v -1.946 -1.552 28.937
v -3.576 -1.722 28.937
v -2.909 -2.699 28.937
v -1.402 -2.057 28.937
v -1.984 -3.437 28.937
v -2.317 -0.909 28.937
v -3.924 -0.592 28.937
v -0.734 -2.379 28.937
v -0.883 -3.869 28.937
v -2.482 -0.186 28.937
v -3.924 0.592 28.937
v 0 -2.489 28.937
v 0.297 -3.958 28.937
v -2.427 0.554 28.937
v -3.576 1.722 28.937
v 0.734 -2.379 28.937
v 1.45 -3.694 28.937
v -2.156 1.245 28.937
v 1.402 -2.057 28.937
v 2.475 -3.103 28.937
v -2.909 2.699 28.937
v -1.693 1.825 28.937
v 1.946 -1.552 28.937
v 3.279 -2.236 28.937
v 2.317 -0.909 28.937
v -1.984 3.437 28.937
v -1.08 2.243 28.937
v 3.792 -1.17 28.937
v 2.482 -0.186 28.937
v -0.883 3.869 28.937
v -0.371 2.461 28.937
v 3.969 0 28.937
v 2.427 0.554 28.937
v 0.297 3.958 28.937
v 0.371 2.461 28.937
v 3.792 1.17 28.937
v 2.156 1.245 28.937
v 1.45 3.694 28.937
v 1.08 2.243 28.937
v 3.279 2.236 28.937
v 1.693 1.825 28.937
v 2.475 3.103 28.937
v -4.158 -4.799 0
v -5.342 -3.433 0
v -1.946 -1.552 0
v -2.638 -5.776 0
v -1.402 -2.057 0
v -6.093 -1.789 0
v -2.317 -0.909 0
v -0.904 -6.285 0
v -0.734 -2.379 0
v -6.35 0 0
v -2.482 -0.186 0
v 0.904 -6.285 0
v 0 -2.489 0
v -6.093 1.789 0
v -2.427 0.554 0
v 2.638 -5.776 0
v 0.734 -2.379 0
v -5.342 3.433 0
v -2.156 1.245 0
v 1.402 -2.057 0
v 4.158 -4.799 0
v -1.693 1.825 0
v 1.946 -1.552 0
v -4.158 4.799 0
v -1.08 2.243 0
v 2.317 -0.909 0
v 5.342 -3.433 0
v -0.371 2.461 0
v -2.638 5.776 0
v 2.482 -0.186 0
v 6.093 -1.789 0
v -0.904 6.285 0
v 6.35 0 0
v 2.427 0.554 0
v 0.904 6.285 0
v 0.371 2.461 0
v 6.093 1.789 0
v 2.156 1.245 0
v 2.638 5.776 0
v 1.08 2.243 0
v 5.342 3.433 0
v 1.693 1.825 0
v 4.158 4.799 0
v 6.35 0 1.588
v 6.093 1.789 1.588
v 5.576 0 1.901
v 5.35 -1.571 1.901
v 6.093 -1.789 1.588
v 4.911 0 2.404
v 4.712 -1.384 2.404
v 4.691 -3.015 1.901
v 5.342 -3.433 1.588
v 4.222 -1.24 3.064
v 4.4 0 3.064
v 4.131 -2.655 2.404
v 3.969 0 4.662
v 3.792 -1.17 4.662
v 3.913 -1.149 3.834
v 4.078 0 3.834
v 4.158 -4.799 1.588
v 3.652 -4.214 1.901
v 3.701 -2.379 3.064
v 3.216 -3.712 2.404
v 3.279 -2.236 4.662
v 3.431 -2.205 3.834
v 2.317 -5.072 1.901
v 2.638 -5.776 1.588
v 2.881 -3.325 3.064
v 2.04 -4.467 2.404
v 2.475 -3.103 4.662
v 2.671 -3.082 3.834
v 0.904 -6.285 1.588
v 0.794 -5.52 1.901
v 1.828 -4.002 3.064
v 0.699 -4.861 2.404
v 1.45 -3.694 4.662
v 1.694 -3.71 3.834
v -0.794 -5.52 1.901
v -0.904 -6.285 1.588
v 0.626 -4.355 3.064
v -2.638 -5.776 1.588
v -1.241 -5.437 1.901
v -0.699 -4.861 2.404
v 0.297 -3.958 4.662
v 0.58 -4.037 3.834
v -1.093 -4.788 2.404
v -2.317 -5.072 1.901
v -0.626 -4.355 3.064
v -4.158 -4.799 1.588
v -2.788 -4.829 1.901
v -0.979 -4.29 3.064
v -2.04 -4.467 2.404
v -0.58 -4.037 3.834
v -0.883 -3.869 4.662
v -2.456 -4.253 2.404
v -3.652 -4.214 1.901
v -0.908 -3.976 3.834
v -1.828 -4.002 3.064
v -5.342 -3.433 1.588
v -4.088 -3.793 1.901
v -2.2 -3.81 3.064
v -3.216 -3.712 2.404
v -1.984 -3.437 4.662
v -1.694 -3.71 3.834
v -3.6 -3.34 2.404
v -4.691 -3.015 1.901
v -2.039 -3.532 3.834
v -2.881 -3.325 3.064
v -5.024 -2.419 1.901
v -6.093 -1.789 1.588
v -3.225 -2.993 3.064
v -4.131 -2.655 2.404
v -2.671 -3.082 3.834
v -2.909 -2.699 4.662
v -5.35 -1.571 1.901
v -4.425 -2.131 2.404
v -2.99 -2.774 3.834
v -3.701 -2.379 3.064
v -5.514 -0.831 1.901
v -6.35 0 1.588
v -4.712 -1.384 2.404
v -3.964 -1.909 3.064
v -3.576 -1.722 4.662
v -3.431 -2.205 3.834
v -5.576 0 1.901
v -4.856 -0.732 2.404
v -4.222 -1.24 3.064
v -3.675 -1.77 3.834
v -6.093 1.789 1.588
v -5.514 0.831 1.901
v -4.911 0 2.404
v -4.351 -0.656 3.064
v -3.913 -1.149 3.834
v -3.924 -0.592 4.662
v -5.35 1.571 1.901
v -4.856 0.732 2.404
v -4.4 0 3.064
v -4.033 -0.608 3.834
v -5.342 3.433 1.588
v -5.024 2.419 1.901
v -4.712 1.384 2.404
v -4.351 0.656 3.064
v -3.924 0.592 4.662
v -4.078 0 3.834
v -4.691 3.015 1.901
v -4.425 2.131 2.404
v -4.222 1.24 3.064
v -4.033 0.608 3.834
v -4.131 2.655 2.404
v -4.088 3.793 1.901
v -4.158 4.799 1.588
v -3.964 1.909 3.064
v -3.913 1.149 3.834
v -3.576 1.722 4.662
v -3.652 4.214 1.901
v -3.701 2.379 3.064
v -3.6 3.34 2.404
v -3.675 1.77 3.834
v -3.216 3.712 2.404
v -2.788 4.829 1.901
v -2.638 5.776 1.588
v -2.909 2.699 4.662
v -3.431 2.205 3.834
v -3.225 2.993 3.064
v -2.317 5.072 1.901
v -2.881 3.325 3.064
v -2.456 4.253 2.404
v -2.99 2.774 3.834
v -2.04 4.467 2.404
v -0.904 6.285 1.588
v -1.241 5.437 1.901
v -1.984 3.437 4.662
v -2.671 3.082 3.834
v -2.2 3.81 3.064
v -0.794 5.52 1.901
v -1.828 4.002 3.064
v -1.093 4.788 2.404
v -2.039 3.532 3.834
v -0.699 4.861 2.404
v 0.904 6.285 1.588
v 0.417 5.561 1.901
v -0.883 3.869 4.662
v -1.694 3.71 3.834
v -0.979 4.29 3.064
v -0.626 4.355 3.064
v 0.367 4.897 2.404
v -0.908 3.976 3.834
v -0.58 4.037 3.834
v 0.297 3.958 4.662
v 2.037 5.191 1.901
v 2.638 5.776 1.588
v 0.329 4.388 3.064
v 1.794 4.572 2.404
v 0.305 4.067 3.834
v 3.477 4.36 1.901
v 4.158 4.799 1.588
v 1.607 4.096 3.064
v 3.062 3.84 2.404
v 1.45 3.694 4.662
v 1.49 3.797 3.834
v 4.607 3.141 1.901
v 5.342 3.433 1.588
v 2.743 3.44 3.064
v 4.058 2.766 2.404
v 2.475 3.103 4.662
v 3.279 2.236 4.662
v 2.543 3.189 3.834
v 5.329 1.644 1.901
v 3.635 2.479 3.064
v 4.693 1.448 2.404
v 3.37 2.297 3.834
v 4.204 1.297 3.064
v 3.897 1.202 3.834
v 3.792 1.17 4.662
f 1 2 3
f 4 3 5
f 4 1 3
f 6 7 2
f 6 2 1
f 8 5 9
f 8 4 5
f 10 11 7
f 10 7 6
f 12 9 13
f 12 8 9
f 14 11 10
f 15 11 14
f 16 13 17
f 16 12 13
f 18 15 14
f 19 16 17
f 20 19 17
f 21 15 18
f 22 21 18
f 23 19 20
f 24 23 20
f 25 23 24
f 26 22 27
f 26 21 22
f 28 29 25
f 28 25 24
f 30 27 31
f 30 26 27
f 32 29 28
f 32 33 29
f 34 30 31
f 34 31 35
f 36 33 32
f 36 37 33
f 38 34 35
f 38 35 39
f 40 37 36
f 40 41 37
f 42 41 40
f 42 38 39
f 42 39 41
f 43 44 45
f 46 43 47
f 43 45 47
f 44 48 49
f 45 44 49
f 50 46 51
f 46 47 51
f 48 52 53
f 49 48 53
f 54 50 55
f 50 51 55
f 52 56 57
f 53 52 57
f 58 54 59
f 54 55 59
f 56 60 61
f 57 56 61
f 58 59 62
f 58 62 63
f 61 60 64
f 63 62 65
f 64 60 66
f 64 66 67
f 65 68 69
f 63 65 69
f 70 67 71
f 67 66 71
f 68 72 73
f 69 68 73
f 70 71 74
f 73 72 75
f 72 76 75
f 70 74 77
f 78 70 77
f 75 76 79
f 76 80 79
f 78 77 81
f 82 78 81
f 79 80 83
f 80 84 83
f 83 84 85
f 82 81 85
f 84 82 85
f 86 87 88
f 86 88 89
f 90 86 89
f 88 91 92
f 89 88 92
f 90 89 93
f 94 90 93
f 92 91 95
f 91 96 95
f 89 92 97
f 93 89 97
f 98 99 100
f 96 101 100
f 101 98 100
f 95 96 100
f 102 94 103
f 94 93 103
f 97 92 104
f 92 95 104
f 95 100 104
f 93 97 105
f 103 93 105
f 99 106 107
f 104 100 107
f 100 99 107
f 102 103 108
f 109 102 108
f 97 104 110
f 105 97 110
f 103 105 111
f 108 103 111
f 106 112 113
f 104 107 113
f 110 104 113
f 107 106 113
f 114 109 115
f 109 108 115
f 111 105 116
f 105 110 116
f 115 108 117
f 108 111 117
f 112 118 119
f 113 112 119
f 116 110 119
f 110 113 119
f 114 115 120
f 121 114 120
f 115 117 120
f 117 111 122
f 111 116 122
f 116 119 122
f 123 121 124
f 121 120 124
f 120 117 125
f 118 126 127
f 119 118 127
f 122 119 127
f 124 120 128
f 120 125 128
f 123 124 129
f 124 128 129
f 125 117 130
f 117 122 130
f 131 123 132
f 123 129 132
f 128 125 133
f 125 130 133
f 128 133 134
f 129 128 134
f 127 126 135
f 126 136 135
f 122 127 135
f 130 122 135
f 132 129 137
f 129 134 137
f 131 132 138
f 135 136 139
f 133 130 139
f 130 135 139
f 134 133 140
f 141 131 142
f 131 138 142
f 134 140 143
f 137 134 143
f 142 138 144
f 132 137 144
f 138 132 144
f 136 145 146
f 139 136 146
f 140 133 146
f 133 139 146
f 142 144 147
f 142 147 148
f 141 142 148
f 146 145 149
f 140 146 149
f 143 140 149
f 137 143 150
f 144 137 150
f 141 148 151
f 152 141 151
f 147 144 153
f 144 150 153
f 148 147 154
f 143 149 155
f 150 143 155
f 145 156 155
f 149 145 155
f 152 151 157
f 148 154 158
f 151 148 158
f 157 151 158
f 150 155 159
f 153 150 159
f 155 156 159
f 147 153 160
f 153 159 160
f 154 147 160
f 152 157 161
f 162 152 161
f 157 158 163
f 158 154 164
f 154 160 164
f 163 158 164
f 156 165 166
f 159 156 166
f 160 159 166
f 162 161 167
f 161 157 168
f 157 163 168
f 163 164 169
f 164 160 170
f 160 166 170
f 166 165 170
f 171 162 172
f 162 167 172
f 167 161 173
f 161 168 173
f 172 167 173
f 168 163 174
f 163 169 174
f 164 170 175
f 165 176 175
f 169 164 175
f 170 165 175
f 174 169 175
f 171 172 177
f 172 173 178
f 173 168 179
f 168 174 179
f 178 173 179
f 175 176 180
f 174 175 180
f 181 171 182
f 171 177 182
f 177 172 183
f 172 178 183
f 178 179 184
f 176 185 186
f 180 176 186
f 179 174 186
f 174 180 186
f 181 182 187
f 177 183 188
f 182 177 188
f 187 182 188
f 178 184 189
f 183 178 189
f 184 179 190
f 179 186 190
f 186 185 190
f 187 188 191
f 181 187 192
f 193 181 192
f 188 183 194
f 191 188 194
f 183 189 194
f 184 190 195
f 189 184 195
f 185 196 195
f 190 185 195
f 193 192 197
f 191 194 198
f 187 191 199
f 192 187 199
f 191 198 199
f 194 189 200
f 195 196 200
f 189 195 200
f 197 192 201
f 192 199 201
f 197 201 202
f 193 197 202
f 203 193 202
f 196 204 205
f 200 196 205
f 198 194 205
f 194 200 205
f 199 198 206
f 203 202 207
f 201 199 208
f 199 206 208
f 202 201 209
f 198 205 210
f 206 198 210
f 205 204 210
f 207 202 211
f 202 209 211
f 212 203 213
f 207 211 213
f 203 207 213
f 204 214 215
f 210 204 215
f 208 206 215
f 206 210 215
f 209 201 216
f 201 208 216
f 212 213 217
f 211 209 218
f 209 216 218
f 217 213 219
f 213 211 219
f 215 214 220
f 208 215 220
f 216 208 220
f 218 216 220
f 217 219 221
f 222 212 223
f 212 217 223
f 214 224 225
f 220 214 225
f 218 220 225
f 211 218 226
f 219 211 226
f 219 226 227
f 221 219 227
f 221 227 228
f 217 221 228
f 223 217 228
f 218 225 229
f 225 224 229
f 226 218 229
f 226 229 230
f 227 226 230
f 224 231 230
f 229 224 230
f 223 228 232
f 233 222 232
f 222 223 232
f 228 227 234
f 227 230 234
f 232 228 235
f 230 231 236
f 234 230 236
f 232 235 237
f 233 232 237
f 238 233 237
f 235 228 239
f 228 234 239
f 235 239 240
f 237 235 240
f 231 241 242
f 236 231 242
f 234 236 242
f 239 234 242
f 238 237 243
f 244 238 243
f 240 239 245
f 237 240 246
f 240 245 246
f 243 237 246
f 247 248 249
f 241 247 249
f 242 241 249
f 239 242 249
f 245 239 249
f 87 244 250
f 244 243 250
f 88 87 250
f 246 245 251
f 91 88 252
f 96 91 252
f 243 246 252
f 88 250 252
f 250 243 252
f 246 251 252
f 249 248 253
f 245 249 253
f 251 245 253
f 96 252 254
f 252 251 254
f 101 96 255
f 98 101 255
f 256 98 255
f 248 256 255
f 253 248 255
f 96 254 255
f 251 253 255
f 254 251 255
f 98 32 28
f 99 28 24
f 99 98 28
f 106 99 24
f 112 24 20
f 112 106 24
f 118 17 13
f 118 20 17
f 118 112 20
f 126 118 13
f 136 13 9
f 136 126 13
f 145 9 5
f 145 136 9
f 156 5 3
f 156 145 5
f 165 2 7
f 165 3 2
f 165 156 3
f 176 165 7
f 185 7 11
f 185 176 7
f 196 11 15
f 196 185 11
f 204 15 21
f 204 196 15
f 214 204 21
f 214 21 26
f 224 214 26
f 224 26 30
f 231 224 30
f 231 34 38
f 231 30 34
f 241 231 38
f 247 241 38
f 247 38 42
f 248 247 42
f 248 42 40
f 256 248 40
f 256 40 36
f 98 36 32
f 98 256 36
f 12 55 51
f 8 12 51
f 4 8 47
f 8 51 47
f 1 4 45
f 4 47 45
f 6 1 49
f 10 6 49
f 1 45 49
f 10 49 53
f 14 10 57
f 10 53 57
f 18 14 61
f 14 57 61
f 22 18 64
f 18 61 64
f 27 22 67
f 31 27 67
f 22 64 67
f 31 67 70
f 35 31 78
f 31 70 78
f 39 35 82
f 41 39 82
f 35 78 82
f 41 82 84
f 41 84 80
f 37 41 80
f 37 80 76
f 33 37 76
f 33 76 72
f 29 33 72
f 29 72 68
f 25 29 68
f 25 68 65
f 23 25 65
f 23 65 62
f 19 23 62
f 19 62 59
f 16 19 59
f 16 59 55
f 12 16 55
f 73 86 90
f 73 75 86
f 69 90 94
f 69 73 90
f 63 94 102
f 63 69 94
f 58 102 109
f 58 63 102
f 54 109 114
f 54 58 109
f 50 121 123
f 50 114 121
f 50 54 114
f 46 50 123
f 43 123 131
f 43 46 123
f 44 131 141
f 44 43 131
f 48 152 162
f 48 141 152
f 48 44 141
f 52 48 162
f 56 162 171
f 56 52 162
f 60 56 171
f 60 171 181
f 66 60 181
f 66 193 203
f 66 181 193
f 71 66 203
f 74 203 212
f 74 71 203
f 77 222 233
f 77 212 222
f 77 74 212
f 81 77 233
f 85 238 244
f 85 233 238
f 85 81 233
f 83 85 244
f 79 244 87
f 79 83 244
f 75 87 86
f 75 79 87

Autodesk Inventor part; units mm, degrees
ref_plane "YZ Plane" through (0, 0, 0) normal (1, 0, 0) x (0, 1, 0)
ref_plane "XZ Plane" through (0, 0, 0) normal (0, 1, 0) x (-1, 0, 0)
ref_plane "XY Plane" through (0, 0, 0) normal (0, 0, 1) x (1, 0, 0)
sketch "Sketch1" plane through (0, 0, 0) normal (0, 0, 1) x (1, 0, 0)
  circle A0 centre (0, 0) radius 6.35
  dimension "d0" = 12.7
extrude "Extrusion1" add sketch "Sketch1" along normal blind 1.5875
sketch "Sketch2" plane through (0, 0, 1.5875) normal (0, 0, 1) x (1, 0, 0)
  circle A0 centre (0, 0) radius 6.35 projected
  circle A1 centre (0, 0) radius 3.9688
  dimension "d3" = 7.9375
extrude "Extrusion2" add sketch "Sketch2" along normal blind 27.3495 contours A1
fillet "Fillet1" radius 3.175 1 edges at (-3.9688, 0, 1.5875)
sketch "Sketch3" plane through (0, 0, 28.937) normal (0, 0, 1) x (1, 0, 0)
  circle A0 centre (0, 0) radius 3.9687 projected
hole "Hole1" at (0, 0, 28.937) direction (0, 0, -1) diameter 4.9784 end through all clearance for "Flat Head Machine Screw (82)" size "#10" standard "Ansi Unified Screw Threads"
properties part number "Pneumatic Standoff Curved" material "Aluminum 6061"
